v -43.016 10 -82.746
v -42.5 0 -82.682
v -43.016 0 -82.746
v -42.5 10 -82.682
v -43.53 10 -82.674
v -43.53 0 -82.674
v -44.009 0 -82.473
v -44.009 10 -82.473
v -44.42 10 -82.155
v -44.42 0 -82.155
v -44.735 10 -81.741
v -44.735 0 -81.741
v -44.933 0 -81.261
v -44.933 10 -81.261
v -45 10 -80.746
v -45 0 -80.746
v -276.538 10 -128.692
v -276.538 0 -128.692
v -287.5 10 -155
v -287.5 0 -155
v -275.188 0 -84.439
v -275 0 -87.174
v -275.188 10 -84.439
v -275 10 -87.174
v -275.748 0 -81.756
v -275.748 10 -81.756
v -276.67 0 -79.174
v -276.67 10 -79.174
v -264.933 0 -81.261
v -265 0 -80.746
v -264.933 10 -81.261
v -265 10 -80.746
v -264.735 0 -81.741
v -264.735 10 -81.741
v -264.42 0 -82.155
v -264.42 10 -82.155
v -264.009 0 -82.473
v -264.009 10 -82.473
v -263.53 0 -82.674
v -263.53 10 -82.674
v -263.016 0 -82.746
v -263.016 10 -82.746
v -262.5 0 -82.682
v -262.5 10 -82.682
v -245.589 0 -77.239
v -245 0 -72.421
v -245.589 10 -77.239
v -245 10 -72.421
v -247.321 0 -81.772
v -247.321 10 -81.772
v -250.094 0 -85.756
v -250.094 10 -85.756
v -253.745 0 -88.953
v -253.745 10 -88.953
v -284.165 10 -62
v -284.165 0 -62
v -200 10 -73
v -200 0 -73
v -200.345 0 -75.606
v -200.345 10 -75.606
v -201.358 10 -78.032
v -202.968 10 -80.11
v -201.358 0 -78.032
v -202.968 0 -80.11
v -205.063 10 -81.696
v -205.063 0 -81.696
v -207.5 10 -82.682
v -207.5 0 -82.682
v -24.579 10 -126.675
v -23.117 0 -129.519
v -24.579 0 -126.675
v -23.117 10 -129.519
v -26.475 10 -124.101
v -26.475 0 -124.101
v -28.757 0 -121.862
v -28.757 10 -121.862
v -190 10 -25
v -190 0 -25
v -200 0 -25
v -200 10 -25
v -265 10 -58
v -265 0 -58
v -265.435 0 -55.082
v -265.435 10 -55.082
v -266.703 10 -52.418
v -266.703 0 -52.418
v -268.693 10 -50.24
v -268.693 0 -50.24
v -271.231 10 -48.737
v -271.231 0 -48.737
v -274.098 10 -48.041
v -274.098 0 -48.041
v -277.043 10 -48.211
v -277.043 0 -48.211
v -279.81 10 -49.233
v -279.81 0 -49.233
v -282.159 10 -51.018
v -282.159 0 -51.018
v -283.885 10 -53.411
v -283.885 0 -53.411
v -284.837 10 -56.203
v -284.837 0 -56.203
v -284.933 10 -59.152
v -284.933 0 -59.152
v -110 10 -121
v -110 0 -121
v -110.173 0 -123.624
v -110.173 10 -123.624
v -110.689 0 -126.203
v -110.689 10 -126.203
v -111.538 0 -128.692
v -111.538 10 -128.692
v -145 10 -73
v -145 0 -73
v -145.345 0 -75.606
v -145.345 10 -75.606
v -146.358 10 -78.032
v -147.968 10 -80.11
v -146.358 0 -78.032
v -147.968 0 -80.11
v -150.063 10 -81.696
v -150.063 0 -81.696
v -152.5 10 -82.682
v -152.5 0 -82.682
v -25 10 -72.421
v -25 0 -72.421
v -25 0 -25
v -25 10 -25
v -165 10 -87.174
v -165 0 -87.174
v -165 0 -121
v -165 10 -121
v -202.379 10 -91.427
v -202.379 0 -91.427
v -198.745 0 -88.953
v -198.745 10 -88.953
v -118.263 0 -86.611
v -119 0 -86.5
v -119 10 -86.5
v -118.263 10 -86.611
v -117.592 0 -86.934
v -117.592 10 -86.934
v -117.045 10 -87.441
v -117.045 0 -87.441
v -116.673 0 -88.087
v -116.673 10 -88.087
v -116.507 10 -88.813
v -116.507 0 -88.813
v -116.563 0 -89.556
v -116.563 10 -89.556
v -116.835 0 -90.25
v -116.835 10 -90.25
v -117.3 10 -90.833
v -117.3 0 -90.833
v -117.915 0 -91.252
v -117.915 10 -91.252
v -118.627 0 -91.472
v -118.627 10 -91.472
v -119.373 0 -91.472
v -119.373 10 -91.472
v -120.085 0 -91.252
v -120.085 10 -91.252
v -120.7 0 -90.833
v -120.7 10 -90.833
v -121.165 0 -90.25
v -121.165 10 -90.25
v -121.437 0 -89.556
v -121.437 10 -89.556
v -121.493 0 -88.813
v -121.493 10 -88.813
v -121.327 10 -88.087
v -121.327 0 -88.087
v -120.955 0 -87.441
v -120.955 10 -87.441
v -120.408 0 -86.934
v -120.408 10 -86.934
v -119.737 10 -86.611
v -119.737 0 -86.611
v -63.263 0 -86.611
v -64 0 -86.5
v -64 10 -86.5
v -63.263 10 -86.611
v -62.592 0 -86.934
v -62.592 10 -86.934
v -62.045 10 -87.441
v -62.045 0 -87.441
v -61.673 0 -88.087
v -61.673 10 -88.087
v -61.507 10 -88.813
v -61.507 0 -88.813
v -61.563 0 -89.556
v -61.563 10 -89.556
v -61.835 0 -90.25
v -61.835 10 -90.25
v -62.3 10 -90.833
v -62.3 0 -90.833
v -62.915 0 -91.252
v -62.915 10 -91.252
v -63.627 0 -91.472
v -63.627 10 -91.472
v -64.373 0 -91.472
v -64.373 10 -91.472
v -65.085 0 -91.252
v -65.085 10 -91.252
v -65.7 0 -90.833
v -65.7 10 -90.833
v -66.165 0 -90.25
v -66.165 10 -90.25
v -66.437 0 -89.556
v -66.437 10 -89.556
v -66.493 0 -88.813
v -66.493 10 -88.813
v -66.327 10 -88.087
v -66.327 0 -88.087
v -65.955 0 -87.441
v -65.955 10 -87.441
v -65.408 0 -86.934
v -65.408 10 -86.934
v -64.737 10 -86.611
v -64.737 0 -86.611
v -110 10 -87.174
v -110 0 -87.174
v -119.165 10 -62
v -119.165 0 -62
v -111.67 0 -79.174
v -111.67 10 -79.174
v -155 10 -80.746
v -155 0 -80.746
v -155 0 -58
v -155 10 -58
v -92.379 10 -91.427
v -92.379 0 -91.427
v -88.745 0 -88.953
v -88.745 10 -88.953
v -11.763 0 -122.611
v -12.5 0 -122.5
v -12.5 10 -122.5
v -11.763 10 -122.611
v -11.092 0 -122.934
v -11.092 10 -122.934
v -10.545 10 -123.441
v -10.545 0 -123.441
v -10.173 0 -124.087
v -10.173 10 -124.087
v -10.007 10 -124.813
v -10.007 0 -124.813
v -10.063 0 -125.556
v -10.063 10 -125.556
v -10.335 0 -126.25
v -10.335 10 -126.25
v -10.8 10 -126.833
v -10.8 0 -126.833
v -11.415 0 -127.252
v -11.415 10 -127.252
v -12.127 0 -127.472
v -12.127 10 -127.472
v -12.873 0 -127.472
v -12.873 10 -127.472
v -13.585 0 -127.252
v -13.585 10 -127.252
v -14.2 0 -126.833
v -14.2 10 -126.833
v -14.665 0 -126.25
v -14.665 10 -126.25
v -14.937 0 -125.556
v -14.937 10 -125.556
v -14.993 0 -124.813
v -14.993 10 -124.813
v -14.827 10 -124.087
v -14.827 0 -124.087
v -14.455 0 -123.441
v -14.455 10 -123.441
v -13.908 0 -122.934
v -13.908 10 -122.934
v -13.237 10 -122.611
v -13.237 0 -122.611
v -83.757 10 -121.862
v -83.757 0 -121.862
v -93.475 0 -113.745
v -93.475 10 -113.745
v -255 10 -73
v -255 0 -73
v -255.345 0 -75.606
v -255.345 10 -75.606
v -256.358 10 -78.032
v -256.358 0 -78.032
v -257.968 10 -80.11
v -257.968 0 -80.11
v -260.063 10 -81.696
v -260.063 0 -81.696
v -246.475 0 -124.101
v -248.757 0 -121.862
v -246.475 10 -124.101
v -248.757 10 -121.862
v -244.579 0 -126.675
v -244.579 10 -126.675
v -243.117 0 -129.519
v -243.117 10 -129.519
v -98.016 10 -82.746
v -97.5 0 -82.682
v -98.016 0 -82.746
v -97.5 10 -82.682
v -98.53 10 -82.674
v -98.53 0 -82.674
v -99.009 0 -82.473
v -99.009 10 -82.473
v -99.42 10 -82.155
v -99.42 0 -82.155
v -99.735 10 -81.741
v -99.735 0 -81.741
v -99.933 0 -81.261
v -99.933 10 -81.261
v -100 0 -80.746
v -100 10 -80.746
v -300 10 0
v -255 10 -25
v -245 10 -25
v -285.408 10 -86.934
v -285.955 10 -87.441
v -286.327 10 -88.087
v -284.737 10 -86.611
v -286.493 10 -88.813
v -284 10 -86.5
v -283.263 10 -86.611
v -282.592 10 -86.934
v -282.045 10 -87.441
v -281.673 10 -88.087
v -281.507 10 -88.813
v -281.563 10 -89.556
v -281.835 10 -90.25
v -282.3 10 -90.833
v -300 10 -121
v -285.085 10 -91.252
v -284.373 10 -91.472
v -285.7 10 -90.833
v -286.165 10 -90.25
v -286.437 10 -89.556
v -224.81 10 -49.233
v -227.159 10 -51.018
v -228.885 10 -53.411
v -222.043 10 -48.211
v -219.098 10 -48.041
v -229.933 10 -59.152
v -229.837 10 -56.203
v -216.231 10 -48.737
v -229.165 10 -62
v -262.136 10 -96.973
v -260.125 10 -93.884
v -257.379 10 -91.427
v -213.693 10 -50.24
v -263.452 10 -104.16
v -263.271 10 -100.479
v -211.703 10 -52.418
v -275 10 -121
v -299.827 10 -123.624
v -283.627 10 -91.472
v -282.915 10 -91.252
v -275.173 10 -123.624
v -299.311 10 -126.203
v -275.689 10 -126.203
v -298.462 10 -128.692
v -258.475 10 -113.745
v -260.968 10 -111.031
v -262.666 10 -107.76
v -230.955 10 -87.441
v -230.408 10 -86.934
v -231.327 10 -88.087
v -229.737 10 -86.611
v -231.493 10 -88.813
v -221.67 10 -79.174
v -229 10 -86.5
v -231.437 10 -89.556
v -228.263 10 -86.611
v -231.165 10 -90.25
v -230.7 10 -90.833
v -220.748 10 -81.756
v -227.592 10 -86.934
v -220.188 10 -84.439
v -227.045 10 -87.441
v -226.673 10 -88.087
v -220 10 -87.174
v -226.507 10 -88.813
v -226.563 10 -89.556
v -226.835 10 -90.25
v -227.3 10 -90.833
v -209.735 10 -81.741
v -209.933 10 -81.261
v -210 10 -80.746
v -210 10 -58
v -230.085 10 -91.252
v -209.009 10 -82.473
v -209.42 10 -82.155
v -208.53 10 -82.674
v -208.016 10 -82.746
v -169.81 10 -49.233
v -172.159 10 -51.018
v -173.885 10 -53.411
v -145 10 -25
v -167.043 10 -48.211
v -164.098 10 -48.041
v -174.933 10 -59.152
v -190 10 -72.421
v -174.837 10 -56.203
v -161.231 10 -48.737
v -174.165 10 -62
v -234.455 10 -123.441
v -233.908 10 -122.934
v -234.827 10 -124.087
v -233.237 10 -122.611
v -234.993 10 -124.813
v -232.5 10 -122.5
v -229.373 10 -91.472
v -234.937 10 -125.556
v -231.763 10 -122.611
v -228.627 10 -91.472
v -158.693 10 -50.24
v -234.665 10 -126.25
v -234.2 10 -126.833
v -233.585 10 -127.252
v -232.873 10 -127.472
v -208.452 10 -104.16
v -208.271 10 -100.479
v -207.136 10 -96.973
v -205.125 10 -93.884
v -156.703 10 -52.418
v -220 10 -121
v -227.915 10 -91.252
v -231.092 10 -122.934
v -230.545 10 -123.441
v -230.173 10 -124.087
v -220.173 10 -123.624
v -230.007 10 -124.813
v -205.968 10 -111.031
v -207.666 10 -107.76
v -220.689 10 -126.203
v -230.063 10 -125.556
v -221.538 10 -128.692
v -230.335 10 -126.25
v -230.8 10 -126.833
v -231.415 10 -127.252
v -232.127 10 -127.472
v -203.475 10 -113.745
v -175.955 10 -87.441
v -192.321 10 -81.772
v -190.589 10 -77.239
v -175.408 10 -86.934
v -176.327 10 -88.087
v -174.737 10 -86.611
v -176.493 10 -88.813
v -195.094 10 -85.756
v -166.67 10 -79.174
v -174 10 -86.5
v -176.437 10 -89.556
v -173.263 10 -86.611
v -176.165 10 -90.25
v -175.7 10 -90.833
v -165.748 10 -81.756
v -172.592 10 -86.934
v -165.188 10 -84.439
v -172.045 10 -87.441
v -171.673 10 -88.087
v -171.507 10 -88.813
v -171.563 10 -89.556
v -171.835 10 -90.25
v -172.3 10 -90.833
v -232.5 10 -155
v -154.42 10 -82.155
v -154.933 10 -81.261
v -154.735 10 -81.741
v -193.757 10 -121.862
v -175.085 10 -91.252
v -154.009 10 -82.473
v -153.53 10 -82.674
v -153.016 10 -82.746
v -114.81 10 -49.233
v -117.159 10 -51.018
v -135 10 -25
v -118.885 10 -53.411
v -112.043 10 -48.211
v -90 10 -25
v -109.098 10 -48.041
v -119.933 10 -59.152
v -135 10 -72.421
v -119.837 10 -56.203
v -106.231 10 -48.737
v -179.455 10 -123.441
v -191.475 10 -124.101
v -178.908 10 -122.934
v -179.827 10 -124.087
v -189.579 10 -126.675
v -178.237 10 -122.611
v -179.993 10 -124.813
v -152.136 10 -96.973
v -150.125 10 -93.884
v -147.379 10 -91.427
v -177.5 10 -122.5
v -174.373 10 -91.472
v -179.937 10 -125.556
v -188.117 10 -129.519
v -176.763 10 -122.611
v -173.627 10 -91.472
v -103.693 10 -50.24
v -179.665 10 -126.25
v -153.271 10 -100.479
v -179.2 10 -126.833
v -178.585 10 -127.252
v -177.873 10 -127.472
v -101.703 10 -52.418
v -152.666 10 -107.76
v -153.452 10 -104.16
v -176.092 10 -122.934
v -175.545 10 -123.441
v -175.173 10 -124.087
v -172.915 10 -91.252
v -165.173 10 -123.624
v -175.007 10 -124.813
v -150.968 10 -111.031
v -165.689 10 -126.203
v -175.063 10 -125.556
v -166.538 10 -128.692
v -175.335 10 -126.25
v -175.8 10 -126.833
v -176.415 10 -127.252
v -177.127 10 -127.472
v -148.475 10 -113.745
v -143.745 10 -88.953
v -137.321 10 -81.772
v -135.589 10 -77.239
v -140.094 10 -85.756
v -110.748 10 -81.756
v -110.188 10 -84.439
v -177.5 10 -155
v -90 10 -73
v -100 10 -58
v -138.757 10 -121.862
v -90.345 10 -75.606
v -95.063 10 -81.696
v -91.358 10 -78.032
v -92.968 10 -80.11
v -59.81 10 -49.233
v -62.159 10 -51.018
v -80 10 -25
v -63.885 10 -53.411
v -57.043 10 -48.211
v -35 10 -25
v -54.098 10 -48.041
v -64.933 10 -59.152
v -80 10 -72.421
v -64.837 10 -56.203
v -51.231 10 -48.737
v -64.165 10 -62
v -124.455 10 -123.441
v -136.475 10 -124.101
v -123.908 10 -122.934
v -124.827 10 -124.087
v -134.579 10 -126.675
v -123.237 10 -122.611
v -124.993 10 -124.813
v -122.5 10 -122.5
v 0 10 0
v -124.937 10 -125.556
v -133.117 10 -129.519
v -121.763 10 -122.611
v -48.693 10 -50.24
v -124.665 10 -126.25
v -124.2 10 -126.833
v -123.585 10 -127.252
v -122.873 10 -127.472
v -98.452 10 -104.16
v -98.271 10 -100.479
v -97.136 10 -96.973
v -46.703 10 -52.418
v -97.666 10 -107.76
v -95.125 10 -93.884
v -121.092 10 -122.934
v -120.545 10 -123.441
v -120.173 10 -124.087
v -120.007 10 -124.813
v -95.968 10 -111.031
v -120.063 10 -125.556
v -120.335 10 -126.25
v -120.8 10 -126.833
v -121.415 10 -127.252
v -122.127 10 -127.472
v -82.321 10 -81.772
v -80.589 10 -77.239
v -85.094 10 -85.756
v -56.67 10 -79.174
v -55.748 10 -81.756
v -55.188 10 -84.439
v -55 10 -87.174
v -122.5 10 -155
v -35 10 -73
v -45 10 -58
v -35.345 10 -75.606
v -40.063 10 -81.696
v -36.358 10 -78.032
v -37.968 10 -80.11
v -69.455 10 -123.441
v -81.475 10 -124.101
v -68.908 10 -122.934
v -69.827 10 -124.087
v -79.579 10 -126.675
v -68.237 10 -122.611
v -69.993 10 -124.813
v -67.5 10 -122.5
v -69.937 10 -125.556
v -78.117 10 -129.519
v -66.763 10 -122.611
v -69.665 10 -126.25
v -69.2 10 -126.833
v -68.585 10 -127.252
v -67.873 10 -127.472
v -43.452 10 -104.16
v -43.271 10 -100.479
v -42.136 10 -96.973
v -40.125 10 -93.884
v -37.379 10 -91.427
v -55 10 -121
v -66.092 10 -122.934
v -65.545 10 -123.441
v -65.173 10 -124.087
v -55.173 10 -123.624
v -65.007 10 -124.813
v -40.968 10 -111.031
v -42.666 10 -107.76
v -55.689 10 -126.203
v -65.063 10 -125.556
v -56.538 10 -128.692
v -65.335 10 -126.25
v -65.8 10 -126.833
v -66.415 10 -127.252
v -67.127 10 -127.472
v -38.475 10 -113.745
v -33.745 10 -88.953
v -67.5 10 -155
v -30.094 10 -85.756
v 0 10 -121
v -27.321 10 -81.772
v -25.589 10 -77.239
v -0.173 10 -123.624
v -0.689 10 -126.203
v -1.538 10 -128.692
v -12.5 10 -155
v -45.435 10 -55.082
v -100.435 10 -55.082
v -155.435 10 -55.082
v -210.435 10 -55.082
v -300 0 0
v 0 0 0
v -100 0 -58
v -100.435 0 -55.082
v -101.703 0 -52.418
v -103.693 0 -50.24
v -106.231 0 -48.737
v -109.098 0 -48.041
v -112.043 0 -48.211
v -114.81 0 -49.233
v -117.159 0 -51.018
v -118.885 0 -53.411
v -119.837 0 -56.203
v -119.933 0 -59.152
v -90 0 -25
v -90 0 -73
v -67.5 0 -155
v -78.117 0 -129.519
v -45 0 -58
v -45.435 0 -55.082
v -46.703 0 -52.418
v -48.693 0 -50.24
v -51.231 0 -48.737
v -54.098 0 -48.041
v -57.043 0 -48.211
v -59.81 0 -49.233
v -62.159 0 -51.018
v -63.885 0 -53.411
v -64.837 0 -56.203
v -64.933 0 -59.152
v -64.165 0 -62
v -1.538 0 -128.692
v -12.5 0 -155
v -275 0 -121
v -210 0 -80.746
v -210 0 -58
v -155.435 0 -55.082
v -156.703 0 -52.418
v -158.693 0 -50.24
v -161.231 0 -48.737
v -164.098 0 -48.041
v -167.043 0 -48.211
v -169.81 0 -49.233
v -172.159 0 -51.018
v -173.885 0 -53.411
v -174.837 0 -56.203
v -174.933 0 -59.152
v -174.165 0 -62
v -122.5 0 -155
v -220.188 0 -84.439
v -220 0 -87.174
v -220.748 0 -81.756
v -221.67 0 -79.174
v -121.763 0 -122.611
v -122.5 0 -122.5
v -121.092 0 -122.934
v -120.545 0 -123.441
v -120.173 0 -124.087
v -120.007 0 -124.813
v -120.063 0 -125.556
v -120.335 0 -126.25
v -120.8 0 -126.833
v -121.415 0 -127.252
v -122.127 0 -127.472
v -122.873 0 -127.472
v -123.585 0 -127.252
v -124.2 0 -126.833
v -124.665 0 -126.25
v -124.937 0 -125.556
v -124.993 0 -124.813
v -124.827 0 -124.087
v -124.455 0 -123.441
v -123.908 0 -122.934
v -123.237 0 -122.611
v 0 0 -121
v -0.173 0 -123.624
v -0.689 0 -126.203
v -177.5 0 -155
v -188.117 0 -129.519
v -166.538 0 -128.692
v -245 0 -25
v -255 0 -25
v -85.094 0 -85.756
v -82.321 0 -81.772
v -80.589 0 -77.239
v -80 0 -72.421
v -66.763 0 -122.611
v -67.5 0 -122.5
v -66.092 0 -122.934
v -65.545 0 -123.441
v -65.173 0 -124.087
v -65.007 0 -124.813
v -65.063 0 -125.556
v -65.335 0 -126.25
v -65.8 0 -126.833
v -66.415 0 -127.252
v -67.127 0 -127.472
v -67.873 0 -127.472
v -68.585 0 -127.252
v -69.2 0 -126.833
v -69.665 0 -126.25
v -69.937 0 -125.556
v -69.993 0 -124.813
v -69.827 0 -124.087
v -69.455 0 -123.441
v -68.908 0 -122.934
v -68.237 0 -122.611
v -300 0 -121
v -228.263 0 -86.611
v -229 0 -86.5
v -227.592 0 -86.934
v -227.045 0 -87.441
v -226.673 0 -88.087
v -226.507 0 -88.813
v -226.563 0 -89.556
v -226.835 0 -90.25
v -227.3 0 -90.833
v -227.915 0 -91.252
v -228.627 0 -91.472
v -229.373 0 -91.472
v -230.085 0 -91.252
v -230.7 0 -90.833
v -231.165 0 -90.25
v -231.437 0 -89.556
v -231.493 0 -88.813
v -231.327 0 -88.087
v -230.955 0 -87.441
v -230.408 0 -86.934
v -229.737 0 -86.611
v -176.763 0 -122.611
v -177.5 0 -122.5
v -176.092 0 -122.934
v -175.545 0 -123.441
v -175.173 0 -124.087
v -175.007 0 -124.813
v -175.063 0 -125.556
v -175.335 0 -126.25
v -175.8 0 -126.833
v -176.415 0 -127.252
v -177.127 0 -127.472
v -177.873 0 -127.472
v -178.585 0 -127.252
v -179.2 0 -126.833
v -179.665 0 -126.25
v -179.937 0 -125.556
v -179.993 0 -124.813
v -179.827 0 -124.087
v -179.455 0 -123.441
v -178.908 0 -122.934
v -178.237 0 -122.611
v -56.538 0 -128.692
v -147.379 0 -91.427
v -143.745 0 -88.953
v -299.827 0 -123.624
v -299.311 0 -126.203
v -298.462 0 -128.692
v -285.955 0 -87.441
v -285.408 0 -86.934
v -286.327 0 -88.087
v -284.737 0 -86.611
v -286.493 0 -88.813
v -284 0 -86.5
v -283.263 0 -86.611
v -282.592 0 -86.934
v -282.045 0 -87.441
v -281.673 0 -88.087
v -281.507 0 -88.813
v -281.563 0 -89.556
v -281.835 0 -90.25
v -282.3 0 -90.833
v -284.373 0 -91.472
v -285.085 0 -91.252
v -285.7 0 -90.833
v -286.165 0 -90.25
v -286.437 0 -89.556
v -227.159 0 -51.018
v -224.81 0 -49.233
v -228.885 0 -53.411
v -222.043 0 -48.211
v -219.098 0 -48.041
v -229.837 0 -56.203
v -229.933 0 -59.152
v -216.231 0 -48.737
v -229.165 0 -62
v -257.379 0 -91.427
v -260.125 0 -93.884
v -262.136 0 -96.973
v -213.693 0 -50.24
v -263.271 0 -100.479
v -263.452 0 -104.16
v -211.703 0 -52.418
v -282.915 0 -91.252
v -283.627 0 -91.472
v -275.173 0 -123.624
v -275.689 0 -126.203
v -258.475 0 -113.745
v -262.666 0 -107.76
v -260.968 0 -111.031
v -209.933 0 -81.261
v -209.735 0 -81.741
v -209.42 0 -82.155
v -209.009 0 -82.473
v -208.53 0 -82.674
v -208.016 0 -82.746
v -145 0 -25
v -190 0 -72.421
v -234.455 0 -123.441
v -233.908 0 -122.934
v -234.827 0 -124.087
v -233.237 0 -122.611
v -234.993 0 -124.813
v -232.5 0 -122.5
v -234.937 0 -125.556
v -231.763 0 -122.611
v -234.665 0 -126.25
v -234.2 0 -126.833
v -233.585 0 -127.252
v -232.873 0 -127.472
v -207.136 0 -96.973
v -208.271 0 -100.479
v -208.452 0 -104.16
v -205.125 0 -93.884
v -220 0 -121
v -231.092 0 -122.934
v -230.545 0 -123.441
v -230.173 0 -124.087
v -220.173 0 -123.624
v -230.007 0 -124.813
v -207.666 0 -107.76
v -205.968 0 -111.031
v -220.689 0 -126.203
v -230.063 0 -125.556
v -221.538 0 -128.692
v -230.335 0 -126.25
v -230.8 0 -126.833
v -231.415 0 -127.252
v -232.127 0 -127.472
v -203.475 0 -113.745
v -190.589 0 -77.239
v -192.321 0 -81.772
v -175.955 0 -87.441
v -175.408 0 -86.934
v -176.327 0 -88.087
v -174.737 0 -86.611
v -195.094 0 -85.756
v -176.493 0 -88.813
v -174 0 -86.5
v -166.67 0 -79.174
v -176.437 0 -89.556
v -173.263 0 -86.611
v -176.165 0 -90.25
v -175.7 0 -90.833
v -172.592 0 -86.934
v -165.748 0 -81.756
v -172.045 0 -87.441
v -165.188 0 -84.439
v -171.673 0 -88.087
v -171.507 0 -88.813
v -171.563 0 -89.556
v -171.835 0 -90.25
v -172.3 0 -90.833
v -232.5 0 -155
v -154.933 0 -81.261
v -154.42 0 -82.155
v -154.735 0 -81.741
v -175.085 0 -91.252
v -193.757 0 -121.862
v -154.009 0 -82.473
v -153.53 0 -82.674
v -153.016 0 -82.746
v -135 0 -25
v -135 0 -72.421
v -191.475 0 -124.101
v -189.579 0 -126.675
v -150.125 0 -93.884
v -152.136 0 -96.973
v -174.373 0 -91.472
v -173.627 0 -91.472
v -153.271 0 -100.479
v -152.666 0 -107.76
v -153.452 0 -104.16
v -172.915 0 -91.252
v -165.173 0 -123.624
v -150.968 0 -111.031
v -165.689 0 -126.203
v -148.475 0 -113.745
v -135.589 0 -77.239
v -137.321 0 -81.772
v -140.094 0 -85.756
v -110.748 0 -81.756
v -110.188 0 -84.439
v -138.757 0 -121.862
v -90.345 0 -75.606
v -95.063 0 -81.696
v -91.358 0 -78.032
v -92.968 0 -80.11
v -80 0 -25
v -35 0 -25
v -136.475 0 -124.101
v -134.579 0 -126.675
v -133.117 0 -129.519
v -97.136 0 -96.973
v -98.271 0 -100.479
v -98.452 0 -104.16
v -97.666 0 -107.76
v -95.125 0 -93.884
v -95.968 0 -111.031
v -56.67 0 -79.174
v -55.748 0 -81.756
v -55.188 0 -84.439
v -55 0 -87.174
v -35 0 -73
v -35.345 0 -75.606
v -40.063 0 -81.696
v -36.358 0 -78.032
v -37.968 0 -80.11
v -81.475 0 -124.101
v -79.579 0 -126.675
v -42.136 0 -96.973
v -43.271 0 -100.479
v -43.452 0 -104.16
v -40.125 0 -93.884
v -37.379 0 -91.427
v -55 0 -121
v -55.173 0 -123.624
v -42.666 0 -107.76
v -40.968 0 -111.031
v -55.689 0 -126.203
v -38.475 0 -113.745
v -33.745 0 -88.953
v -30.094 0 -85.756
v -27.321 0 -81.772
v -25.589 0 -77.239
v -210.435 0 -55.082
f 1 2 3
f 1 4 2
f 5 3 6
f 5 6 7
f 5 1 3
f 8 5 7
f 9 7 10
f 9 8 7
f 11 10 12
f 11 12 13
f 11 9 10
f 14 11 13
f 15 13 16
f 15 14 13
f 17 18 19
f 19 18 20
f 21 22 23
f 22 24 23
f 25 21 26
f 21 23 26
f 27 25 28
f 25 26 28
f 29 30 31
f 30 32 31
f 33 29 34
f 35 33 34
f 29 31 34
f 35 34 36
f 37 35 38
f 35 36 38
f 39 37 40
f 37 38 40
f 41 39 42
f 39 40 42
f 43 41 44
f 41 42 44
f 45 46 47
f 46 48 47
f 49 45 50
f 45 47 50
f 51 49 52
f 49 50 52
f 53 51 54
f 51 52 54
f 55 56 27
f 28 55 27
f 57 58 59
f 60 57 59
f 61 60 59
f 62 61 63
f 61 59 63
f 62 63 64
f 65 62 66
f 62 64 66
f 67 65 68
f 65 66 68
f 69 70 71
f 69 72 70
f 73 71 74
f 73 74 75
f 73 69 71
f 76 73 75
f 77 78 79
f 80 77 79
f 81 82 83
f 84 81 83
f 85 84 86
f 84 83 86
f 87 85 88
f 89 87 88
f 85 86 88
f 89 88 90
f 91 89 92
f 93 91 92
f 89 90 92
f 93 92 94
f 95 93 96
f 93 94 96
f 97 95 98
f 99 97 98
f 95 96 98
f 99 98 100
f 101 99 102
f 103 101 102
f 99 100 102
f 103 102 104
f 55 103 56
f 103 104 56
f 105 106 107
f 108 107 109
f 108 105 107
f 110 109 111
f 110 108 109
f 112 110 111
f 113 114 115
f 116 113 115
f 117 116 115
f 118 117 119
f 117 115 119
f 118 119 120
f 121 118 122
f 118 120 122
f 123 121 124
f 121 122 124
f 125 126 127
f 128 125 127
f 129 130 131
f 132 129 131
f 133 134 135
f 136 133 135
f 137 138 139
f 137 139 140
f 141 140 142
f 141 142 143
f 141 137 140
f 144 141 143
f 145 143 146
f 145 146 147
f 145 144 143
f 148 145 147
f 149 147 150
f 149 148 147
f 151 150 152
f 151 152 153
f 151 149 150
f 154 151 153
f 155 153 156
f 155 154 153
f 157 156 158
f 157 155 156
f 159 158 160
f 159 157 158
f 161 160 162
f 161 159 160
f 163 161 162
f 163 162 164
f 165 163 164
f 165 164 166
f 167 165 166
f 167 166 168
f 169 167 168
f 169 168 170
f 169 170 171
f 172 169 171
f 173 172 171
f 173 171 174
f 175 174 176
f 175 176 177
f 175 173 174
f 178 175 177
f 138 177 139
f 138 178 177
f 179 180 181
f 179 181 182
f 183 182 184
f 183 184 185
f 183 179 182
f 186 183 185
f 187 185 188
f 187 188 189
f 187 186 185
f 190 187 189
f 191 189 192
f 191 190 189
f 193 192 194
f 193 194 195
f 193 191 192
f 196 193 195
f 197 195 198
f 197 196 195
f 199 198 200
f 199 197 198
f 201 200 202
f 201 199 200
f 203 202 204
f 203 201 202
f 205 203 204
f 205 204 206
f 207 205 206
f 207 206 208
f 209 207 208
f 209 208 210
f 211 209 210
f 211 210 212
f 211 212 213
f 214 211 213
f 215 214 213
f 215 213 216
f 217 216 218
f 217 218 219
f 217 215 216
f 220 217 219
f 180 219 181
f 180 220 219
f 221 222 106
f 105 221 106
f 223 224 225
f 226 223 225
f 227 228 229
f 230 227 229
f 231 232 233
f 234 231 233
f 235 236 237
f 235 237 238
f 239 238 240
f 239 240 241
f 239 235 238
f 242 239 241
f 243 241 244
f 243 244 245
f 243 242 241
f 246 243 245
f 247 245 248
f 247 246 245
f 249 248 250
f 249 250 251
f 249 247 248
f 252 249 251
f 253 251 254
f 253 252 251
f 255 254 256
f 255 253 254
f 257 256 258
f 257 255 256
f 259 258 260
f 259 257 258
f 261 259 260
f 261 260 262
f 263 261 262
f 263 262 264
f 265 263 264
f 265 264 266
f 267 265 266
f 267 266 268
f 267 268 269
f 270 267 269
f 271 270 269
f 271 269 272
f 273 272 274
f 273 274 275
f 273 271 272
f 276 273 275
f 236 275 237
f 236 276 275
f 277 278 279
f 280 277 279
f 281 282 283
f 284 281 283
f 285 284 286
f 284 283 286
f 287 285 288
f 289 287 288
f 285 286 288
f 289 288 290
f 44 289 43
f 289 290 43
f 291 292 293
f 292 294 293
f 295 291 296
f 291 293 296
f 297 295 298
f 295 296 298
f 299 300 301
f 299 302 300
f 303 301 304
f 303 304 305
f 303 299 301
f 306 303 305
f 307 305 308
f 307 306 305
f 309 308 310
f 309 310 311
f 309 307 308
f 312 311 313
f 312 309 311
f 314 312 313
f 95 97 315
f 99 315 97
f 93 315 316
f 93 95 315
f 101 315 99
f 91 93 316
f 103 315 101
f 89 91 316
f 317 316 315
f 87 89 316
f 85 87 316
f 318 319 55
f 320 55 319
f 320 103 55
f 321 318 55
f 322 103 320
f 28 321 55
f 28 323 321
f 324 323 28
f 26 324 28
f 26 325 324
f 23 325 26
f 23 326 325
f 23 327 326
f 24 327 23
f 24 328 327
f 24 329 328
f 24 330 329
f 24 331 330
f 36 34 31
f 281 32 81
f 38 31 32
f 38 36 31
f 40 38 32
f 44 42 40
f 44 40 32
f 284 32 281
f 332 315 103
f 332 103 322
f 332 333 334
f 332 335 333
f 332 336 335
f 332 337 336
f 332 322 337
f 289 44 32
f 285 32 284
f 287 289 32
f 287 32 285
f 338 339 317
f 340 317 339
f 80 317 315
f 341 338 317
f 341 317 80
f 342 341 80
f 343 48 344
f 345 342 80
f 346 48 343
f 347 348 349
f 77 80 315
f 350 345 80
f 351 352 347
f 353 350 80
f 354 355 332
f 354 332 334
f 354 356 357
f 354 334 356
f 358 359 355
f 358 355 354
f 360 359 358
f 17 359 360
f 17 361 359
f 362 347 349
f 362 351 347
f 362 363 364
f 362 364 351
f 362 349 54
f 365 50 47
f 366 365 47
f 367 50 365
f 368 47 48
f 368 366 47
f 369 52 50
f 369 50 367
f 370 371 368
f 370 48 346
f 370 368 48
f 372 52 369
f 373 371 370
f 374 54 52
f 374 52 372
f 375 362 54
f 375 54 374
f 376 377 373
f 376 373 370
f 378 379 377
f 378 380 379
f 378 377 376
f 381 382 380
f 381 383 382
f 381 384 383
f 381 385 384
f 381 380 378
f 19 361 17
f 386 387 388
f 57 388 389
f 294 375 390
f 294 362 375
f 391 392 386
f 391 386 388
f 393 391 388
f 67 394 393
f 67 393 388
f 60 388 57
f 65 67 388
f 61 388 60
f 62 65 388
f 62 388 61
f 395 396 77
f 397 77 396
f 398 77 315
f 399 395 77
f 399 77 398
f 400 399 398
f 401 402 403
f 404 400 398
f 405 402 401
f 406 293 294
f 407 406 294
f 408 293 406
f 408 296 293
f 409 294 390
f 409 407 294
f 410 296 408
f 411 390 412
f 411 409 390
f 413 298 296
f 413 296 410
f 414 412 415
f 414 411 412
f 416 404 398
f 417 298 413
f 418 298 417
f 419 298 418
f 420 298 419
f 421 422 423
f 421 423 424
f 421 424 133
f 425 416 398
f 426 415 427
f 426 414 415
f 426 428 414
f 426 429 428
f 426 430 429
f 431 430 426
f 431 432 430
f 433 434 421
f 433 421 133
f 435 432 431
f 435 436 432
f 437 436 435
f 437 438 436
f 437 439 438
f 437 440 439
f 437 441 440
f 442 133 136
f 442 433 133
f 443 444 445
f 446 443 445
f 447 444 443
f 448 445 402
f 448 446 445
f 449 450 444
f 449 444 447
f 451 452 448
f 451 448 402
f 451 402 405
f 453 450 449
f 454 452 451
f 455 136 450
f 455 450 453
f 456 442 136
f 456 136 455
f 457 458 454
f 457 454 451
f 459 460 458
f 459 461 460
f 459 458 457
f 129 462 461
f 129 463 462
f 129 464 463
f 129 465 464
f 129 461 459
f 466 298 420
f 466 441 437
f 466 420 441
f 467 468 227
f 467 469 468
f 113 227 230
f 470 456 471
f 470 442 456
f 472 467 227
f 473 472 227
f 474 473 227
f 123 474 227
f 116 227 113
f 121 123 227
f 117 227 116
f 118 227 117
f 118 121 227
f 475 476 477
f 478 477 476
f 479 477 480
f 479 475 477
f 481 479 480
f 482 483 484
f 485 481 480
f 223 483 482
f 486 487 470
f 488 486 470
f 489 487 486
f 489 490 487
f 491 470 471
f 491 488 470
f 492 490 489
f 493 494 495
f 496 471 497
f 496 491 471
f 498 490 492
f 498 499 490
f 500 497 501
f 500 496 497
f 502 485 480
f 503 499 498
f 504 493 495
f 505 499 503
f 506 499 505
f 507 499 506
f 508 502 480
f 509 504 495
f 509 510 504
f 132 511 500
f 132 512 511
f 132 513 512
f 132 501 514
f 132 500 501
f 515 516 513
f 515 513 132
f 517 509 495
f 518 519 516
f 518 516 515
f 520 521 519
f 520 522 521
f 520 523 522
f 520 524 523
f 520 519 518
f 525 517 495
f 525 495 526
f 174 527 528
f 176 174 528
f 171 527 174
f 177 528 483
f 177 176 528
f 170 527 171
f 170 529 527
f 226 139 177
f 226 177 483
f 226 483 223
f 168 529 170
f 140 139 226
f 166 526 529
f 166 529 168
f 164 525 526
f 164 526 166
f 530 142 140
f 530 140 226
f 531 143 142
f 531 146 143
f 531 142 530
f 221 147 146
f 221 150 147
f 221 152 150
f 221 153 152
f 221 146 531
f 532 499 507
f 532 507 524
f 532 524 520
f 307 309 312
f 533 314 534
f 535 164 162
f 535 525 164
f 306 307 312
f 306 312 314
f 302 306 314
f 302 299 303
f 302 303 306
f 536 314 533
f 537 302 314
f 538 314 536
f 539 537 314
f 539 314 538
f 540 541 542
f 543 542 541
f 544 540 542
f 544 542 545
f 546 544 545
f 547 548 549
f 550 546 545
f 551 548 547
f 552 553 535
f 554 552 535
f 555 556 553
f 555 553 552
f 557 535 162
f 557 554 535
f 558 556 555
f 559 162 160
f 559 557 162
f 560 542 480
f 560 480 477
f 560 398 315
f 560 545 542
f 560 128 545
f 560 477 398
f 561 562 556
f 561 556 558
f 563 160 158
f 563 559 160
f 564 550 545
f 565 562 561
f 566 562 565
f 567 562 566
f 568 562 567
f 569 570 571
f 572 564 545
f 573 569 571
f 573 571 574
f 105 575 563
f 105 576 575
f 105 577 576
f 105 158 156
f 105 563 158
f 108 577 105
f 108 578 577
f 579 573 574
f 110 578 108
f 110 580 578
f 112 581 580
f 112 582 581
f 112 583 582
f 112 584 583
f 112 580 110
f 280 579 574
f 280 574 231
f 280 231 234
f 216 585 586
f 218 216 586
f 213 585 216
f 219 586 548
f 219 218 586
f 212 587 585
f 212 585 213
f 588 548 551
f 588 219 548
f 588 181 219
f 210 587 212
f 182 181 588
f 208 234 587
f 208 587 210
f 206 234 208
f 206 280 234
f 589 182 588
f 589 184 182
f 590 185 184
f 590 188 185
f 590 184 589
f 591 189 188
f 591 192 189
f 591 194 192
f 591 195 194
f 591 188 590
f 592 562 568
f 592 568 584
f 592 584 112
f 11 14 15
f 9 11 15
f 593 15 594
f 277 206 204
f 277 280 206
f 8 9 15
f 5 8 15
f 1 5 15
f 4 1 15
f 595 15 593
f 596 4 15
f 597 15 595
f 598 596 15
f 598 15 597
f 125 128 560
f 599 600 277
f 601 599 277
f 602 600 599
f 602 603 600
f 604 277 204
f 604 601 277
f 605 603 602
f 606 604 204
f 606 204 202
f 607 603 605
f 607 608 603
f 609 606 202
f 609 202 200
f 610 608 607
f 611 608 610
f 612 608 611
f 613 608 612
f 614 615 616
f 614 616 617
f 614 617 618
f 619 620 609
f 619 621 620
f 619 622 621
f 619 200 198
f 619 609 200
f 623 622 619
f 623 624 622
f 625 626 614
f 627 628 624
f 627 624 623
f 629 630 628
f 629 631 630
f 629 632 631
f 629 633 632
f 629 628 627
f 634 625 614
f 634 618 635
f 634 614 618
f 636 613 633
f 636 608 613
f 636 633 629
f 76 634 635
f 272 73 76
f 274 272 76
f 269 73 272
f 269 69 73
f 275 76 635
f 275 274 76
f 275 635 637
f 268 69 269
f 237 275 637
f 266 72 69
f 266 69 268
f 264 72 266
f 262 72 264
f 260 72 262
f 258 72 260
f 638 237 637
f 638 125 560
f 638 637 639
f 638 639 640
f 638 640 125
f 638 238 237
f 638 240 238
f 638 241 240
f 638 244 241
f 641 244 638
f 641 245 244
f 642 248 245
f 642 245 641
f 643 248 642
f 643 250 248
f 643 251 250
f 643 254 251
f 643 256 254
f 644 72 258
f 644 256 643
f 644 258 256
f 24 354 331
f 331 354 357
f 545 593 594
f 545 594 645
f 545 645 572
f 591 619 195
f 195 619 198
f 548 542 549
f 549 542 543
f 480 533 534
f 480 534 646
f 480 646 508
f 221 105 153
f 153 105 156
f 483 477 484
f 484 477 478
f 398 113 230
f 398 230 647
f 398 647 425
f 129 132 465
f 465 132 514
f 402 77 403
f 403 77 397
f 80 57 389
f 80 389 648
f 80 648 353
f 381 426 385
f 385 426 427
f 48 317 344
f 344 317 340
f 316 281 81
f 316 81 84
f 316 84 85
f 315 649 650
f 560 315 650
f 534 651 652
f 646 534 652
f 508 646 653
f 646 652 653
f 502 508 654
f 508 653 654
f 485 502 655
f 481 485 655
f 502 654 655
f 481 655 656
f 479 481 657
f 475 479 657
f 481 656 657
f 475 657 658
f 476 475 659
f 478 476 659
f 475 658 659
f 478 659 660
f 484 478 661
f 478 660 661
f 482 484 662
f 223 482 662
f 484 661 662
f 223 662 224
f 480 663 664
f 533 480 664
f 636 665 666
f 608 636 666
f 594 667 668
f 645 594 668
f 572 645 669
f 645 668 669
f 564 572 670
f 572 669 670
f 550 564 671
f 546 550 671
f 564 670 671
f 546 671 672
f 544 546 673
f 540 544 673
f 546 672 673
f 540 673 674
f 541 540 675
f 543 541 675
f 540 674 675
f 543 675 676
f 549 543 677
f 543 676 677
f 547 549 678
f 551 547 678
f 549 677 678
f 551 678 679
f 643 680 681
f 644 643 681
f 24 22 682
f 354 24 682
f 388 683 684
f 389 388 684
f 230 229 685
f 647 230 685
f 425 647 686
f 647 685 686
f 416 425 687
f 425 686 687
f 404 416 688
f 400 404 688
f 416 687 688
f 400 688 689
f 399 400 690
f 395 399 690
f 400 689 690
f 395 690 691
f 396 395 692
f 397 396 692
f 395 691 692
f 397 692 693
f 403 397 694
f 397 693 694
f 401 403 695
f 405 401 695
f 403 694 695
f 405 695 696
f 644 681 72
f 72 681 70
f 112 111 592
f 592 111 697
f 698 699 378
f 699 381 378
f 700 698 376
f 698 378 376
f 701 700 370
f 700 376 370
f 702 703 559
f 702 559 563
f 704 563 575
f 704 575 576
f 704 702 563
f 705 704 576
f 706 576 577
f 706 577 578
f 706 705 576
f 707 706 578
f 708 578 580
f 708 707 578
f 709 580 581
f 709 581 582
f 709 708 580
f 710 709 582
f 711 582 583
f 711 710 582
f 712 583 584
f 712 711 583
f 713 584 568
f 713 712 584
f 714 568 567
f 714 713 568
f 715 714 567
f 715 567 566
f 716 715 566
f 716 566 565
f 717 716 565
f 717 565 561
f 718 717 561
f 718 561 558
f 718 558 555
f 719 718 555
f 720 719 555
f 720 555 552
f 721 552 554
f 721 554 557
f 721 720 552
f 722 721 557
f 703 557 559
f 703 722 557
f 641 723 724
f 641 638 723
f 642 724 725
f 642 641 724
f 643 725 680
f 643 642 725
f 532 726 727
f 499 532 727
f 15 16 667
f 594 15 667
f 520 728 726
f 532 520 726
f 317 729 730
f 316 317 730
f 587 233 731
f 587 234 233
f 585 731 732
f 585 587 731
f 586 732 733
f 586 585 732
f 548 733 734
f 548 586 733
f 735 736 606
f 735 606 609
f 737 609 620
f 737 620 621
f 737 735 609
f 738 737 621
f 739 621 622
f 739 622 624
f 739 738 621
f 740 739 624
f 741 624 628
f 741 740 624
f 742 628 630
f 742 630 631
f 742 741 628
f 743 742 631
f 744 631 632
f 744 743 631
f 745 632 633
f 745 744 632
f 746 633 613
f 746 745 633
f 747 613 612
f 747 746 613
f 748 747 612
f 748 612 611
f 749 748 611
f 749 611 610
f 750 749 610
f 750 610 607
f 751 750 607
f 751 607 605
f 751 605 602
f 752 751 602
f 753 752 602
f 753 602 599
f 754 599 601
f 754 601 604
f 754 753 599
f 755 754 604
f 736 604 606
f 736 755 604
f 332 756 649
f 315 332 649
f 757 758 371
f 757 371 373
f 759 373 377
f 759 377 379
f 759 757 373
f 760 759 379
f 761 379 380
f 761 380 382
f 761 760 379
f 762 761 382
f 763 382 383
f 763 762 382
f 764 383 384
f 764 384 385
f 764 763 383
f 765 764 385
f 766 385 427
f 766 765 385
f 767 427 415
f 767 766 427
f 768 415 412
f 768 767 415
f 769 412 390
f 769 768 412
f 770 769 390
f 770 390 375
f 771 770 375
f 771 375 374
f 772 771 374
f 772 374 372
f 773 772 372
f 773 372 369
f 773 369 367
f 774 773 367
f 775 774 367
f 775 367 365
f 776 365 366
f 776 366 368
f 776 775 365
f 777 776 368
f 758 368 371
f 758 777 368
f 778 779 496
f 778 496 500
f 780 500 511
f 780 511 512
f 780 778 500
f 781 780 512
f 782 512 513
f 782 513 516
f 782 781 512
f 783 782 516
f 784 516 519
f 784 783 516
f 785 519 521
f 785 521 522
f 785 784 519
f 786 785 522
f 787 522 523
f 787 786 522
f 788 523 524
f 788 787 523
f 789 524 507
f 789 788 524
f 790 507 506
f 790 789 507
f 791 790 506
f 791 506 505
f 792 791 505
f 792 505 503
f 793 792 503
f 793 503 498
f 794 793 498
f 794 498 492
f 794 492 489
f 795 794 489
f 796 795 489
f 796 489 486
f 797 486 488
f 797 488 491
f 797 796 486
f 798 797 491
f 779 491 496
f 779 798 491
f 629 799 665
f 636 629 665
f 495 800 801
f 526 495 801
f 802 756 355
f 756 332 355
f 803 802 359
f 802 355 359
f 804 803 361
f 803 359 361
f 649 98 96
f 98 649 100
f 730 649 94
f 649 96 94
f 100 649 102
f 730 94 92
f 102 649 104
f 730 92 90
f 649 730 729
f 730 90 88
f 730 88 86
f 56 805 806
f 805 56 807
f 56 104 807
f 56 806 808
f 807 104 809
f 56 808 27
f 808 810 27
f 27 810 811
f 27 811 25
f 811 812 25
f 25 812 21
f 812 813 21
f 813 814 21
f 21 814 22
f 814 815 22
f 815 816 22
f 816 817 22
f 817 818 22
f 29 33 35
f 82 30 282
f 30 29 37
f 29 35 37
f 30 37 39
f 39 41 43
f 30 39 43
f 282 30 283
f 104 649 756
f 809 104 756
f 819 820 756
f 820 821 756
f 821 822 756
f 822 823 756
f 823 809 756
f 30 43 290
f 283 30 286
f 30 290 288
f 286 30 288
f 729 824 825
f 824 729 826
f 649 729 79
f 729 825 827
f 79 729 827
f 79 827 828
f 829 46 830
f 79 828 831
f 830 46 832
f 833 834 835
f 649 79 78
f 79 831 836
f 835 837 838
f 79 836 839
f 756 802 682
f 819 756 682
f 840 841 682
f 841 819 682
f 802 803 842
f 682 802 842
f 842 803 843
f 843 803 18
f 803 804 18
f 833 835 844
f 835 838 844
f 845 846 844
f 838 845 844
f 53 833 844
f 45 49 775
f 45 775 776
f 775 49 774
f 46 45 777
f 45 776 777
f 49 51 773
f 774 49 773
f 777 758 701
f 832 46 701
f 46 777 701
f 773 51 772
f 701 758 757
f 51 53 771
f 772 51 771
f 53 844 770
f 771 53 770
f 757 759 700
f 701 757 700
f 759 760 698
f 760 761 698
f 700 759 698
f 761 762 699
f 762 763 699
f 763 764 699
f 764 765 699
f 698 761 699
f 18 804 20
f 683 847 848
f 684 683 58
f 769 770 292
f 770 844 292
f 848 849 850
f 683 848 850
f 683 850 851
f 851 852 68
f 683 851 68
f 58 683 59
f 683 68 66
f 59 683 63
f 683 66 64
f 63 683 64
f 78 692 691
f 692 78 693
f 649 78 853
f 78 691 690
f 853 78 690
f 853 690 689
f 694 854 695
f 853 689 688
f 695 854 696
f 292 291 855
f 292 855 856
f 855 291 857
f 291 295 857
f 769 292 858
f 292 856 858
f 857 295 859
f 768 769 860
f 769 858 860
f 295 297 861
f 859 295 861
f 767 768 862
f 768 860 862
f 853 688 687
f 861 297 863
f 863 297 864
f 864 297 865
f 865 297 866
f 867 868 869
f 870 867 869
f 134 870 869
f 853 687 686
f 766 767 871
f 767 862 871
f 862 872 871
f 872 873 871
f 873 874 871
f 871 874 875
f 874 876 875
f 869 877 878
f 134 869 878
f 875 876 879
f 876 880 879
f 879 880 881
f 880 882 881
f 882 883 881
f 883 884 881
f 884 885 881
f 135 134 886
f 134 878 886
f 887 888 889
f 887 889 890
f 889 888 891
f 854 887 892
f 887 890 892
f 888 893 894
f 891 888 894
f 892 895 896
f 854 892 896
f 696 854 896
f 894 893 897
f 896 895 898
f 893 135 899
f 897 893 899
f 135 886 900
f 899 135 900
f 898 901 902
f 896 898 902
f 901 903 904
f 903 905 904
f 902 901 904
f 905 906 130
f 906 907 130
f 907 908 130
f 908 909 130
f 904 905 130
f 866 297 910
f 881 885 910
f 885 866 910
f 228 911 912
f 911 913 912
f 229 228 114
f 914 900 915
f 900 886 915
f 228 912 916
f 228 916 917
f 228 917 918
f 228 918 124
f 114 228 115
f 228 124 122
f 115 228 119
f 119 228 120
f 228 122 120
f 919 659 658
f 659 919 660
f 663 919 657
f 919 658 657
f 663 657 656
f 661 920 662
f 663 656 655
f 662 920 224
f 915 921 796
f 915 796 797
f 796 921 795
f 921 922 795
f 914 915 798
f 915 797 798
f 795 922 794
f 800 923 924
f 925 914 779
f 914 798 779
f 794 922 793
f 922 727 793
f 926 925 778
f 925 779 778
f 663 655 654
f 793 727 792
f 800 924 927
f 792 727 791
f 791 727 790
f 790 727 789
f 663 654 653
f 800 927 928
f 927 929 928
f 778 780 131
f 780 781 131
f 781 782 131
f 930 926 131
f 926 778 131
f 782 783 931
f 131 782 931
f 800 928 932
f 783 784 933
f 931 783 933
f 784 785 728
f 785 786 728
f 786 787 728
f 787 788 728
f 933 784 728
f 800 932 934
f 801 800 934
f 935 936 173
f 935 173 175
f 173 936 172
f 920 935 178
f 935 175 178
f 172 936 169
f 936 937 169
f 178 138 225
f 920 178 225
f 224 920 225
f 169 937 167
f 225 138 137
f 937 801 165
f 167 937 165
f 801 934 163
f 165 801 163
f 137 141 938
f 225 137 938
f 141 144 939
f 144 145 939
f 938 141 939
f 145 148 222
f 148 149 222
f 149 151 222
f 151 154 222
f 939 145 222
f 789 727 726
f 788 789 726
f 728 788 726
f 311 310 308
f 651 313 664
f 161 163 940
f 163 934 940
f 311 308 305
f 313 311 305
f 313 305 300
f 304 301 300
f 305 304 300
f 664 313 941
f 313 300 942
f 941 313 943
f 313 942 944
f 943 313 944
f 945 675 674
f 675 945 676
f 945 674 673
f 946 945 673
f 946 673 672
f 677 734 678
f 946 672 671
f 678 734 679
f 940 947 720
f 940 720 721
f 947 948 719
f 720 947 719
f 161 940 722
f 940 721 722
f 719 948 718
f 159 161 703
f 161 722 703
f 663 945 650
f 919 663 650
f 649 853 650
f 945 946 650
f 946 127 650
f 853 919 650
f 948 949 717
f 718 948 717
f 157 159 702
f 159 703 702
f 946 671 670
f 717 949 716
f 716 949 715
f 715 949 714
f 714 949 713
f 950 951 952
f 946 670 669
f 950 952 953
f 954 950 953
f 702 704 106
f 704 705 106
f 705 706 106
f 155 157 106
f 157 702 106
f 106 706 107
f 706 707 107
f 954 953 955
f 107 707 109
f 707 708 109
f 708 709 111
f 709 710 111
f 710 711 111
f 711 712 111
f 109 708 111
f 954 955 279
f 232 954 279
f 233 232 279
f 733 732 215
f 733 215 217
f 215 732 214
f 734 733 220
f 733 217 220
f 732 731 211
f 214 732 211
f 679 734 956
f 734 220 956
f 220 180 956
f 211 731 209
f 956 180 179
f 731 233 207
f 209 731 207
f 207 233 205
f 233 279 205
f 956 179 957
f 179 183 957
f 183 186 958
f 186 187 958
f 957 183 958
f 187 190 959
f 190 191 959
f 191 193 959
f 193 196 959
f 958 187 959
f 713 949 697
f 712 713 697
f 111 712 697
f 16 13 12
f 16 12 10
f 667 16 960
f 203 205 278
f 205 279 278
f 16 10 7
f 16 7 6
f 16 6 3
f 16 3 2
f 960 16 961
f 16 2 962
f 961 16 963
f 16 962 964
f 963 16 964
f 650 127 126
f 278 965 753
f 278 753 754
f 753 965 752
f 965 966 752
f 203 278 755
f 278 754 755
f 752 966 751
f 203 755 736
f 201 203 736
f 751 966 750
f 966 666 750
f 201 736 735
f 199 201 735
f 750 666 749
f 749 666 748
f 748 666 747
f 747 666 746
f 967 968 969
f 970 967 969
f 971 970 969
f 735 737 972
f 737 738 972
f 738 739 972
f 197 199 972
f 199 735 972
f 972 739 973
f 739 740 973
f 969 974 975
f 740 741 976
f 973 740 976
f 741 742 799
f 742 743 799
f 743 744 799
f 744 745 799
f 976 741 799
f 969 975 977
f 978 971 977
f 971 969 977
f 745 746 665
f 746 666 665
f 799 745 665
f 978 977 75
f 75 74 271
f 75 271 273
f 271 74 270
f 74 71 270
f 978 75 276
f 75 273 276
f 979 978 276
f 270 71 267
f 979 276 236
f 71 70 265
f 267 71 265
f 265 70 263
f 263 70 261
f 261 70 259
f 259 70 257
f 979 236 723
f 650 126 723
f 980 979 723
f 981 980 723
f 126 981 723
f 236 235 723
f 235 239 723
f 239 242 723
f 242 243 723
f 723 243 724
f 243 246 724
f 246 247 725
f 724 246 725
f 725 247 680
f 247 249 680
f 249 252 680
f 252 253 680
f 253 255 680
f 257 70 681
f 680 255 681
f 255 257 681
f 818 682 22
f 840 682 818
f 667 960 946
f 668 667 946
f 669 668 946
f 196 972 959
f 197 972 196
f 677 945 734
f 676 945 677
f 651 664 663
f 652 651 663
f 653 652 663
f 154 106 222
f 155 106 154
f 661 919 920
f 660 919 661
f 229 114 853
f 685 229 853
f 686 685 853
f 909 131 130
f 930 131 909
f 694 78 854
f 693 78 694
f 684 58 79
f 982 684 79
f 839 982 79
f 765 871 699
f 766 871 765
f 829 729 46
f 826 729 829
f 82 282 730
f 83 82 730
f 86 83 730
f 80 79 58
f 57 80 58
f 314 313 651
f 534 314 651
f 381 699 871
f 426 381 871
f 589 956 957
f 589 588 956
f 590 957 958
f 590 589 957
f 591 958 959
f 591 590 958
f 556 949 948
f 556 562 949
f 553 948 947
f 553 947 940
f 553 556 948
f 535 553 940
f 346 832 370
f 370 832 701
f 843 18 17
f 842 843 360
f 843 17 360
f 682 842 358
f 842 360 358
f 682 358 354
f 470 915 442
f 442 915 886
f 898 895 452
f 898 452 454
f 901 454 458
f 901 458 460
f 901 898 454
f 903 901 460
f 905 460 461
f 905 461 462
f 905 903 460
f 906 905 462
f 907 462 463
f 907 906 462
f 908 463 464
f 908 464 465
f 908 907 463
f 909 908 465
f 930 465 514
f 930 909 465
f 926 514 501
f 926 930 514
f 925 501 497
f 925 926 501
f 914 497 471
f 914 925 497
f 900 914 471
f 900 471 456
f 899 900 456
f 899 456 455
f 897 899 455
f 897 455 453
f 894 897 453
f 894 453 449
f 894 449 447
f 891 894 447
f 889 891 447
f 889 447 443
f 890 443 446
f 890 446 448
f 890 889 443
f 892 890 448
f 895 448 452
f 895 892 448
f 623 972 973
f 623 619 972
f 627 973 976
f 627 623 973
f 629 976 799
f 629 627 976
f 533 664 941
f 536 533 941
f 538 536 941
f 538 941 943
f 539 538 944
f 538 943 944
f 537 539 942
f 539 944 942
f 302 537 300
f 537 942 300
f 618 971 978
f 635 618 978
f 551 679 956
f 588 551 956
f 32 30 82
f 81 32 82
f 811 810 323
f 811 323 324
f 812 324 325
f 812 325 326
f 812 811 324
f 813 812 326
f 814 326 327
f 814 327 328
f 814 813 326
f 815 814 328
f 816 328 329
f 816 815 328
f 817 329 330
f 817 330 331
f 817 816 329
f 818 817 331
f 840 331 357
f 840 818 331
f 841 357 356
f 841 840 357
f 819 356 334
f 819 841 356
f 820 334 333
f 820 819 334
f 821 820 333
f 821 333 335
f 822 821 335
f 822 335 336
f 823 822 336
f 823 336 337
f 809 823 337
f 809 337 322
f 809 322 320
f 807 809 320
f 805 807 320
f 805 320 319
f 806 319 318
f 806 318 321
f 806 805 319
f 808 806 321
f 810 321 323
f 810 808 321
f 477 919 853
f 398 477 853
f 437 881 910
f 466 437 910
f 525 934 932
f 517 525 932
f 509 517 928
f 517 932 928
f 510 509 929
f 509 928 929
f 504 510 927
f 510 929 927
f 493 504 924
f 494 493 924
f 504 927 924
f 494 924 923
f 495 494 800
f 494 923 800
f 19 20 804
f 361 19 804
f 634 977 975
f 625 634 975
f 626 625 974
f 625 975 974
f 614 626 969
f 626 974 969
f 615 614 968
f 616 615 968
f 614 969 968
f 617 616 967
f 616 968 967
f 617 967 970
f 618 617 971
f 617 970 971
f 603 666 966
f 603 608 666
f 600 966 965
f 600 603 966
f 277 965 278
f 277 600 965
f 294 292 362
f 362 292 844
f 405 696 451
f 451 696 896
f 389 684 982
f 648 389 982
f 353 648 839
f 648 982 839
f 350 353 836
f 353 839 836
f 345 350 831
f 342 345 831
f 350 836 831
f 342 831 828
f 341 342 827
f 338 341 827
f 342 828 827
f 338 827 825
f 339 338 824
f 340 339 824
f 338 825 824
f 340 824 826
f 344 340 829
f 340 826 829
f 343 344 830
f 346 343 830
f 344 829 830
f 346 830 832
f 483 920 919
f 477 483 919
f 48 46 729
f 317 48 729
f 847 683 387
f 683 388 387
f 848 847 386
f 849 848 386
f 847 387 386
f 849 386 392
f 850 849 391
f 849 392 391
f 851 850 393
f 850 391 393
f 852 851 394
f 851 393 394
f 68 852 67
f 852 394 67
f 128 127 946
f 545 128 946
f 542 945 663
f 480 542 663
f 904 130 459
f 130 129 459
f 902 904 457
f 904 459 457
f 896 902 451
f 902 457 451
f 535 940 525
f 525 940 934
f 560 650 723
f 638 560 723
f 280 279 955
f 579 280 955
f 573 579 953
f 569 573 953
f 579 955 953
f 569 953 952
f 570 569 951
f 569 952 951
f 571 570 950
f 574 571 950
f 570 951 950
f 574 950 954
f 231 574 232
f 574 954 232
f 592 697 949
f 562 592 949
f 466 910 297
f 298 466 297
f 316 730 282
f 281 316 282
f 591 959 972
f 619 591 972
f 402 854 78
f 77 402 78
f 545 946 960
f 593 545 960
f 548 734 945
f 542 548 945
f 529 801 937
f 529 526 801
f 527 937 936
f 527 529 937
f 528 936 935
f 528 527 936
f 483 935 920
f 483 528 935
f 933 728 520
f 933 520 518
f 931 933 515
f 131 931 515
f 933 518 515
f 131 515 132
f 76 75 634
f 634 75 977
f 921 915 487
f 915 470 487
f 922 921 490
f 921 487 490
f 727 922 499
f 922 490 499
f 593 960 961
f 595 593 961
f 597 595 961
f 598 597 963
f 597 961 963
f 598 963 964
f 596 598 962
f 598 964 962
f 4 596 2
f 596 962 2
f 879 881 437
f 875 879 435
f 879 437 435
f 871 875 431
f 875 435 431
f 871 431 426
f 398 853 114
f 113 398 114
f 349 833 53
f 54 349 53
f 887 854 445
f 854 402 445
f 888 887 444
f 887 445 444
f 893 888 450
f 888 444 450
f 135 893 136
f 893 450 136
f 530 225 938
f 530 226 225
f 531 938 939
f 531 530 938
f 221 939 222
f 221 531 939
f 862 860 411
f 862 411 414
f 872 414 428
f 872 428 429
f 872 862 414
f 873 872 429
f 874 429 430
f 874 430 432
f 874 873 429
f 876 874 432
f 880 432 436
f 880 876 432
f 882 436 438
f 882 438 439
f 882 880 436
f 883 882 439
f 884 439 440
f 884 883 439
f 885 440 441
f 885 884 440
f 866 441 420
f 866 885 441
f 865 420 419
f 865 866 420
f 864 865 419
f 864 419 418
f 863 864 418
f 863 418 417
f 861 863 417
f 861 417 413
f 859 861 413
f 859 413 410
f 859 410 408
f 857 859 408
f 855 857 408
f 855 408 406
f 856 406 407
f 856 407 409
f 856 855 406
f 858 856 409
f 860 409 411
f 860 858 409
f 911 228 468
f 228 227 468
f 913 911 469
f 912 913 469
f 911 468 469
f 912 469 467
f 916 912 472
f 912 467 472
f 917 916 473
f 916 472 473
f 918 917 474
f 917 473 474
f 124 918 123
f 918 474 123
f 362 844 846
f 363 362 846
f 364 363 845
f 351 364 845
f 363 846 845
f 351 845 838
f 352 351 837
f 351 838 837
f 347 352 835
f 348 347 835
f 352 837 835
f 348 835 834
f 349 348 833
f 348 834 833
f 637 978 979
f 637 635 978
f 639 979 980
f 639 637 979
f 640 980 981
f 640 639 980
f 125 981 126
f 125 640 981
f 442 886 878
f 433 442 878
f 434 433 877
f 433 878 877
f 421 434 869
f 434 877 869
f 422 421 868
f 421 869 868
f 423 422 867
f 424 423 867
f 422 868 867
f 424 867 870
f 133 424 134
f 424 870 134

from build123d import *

# Parameters (mm, degrees)
SKETCH1_R           = 2.5
BOSS_EXTRUDE1_DEPTH = 10
FILLET1_R           = 20
FILLET2_R           = 2


with BuildPart() as part:
    # Sketch1 → Boss-Extrude1 (new body)
    with BuildSketch(Plane(origin=(0, 0, 0), x_dir=(1, 0, 0), z_dir=(0, 1, 0))):
        with BuildLine():
            Line((0, 0), (0, 125))
            Line((0, 125), (-12.5, 155))
            Line((-12.5, 155), (-25, 125))
            Line((-25, 125), (-38.474856438, 113.744856999))
            ThreePointArc((-38.474856438, 113.744856999), (-43.483141428, 102.313155182), (-37.378629761, 91.427308304))
            Line((-37.378629761, 91.427308304), (-25, 83))
            Line((-25, 83), (-25, 25))
            Line((-25, 25), (-35, 25))
            Line((-35, 25), (-35, 73))
            ThreePointArc((-35, 73), (-37.928932188, 80.071067812), (-45, 83))
            Line((-45, 83), (-45, 58))
            ThreePointArc((-45, 58), (-57.043096437, 48.210936871), (-64.16515139, 62))
            Line((-64.16515139, 62), (-55, 83))
            Line((-55, 83), (-55, 125))
            Line((-55, 125), (-67.5, 155))
            Line((-67.5, 155), (-80, 125))
            Line((-80, 125), (-93.474856438, 113.744856999))
            ThreePointArc((-93.474856438, 113.744856999), (-98.483141428, 102.313155182), (-92.378629761, 91.427308304))
            Line((-92.378629761, 91.427308304), (-80, 83))
            Line((-80, 83), (-80, 25))
            Line((-80, 25), (-90, 25))
            Line((-90, 25), (-90, 73))
            ThreePointArc((-90, 73), (-92.928932188, 80.071067812), (-100, 83))
            Line((-100, 83), (-100, 58))
            ThreePointArc((-100, 58), (-112.043096437, 48.210936871), (-119.16515139, 62))
            Line((-119.16515139, 62), (-110, 83))
            Line((-110, 83), (-110, 125))
            Line((-110, 125), (-122.5, 155))
            Line((-122.5, 155), (-135, 125))
            Line((-135, 125), (-148.474856438, 113.744856999))
            ThreePointArc((-148.474856438, 113.744856999), (-153.483141428, 102.313155182), (-147.378629761, 91.427308304))
            Line((-147.378629761, 91.427308304), (-135, 83))
            Line((-135, 83), (-135, 25))
            Line((-135, 25), (-145, 25))
            Line((-145, 25), (-145, 73))
            ThreePointArc((-145, 73), (-147.928932188, 80.071067812), (-155, 83))
            Line((-155, 83), (-155, 58))
            ThreePointArc((-155, 58), (-167.043096437, 48.210936871), (-174.16515139, 62))
            Line((-174.16515139, 62), (-165, 83))
            Line((-165, 83), (-165, 125))
            Line((-165, 125), (-177.5, 155))
            Line((-177.5, 155), (-190, 125))
            Line((-190, 125), (-203.474856438, 113.744856999))
            ThreePointArc((-203.474856438, 113.744856999), (-208.483141428, 102.313155182), (-202.378629761, 91.427308304))
            Line((-202.378629761, 91.427308304), (-190, 83))
            Line((-190, 83), (-190, 25))
            Line((-190, 25), (-200, 25))
            Line((-200, 25), (-200, 73))
            ThreePointArc((-200, 73), (-202.928932188, 80.071067812), (-210, 83))
            Line((-210, 83), (-210, 58))
            ThreePointArc((-210, 58), (-222.043096437, 48.210936871), (-229.16515139, 62))
            Line((-229.16515139, 62), (-220, 83))
            Line((-220, 83), (-220, 125))
            Line((-220, 125), (-232.5, 155))
            Line((-232.5, 155), (-245, 125))
            Line((-245, 125), (-258.474856438, 113.744856999))
            ThreePointArc((-258.474856438, 113.744856999), (-263.483141428, 102.313155182), (-257.378629761, 91.427308304))
            Line((-257.378629761, 91.427308304), (-245, 83))
            Line((-245, 83), (-245, 25))
            Line((-245, 25), (-255, 25))
            Line((-255, 25), (-255, 73))
            ThreePointArc((-255, 73), (-257.928932188, 80.071067812), (-265, 83))
            Line((-265, 83), (-265, 58))
            ThreePointArc((-265, 58), (-277.043096437, 48.210936871), (-284.16515139, 62))
            Line((-284.16515139, 62), (-275, 83))
            Line((-275, 83), (-275, 125))
            Line((-275, 125), (-287.5, 155))
            Line((-287.5, 155), (-300, 125))
            Line((-300, 125), (-300, 0))
            Line((-300, 0), (0, 0))
        make_face()
        with Locations(Location((-12.5, 125, 0), (0, 0, 270))):
            Circle(SKETCH1_R, mode=Mode.SUBTRACT)
        with Locations(Location((-64, 89, 0), (0, 0, 270))):
            Circle(SKETCH1_R, mode=Mode.SUBTRACT)
        with Locations(Location((-67.5, 125, 0), (0, 0, 270))):
            Circle(SKETCH1_R, mode=Mode.SUBTRACT)
        with Locations(Location((-119, 89, 0), (0, 0, 270))):
            Circle(SKETCH1_R, mode=Mode.SUBTRACT)
        with Locations(Location((-122.5, 125, 0), (0, 0, 270))):
            Circle(SKETCH1_R, mode=Mode.SUBTRACT)
        with Locations(Location((-174, 89, 0), (0, 0, 270))):
            Circle(SKETCH1_R, mode=Mode.SUBTRACT)
        with Locations(Location((-177.5, 125, 0), (0, 0, 270))):
            Circle(SKETCH1_R, mode=Mode.SUBTRACT)
        with Locations(Location((-229, 89, 0), (0, 0, 270))):
            Circle(SKETCH1_R, mode=Mode.SUBTRACT)
        with Locations(Location((-232.5, 125, 0), (0, 0, 270))):
            Circle(SKETCH1_R, mode=Mode.SUBTRACT)
        with Locations(Location((-284, 89, 0), (0, 0, 270))):
            Circle(SKETCH1_R, mode=Mode.SUBTRACT)
    extrude(amount=BOSS_EXTRUDE1_DEPTH)

    # Fillet1
    fillet1_edges = [part.edges().sort_by_distance(p)[0] for p in [
        (-300, 5, -125),
        (-275, 5, -125),
        (-275, 5, -83),
        (-245, 5, -83),
        (-245, 5, -125),
        (-220, 5, -125),
        (-220, 5, -83),
        (-190, 5, -83),
        (-190, 5, -125),
        (-165, 5, -125),
        (-165, 5, -83),
        (-135, 5, -83),
        (-135, 5, -125),
        (-110, 5, -125),
        (-110, 5, -83),
        (-80, 5, -83),
        (-80, 5, -125),
        (-55, 5, -125),
        (-55, 5, -83),
        (-25, 5, -83),
        (-25, 5, -125),
        (0, 5, -125),
    ]]
    fillet(fillet1_edges, radius=FILLET1_R)

    # Fillet2
    fillet2_edges = [part.edges().sort_by_distance(p)[0] for p in [
        (-265, 5, -83),
        (-210, 5, -83),
        (-155, 5, -83),
        (-100, 5, -83),
        (-45, 5, -83),
    ]]
    fillet(fillet2_edges, radius=FILLET2_R)


solid = part.part
